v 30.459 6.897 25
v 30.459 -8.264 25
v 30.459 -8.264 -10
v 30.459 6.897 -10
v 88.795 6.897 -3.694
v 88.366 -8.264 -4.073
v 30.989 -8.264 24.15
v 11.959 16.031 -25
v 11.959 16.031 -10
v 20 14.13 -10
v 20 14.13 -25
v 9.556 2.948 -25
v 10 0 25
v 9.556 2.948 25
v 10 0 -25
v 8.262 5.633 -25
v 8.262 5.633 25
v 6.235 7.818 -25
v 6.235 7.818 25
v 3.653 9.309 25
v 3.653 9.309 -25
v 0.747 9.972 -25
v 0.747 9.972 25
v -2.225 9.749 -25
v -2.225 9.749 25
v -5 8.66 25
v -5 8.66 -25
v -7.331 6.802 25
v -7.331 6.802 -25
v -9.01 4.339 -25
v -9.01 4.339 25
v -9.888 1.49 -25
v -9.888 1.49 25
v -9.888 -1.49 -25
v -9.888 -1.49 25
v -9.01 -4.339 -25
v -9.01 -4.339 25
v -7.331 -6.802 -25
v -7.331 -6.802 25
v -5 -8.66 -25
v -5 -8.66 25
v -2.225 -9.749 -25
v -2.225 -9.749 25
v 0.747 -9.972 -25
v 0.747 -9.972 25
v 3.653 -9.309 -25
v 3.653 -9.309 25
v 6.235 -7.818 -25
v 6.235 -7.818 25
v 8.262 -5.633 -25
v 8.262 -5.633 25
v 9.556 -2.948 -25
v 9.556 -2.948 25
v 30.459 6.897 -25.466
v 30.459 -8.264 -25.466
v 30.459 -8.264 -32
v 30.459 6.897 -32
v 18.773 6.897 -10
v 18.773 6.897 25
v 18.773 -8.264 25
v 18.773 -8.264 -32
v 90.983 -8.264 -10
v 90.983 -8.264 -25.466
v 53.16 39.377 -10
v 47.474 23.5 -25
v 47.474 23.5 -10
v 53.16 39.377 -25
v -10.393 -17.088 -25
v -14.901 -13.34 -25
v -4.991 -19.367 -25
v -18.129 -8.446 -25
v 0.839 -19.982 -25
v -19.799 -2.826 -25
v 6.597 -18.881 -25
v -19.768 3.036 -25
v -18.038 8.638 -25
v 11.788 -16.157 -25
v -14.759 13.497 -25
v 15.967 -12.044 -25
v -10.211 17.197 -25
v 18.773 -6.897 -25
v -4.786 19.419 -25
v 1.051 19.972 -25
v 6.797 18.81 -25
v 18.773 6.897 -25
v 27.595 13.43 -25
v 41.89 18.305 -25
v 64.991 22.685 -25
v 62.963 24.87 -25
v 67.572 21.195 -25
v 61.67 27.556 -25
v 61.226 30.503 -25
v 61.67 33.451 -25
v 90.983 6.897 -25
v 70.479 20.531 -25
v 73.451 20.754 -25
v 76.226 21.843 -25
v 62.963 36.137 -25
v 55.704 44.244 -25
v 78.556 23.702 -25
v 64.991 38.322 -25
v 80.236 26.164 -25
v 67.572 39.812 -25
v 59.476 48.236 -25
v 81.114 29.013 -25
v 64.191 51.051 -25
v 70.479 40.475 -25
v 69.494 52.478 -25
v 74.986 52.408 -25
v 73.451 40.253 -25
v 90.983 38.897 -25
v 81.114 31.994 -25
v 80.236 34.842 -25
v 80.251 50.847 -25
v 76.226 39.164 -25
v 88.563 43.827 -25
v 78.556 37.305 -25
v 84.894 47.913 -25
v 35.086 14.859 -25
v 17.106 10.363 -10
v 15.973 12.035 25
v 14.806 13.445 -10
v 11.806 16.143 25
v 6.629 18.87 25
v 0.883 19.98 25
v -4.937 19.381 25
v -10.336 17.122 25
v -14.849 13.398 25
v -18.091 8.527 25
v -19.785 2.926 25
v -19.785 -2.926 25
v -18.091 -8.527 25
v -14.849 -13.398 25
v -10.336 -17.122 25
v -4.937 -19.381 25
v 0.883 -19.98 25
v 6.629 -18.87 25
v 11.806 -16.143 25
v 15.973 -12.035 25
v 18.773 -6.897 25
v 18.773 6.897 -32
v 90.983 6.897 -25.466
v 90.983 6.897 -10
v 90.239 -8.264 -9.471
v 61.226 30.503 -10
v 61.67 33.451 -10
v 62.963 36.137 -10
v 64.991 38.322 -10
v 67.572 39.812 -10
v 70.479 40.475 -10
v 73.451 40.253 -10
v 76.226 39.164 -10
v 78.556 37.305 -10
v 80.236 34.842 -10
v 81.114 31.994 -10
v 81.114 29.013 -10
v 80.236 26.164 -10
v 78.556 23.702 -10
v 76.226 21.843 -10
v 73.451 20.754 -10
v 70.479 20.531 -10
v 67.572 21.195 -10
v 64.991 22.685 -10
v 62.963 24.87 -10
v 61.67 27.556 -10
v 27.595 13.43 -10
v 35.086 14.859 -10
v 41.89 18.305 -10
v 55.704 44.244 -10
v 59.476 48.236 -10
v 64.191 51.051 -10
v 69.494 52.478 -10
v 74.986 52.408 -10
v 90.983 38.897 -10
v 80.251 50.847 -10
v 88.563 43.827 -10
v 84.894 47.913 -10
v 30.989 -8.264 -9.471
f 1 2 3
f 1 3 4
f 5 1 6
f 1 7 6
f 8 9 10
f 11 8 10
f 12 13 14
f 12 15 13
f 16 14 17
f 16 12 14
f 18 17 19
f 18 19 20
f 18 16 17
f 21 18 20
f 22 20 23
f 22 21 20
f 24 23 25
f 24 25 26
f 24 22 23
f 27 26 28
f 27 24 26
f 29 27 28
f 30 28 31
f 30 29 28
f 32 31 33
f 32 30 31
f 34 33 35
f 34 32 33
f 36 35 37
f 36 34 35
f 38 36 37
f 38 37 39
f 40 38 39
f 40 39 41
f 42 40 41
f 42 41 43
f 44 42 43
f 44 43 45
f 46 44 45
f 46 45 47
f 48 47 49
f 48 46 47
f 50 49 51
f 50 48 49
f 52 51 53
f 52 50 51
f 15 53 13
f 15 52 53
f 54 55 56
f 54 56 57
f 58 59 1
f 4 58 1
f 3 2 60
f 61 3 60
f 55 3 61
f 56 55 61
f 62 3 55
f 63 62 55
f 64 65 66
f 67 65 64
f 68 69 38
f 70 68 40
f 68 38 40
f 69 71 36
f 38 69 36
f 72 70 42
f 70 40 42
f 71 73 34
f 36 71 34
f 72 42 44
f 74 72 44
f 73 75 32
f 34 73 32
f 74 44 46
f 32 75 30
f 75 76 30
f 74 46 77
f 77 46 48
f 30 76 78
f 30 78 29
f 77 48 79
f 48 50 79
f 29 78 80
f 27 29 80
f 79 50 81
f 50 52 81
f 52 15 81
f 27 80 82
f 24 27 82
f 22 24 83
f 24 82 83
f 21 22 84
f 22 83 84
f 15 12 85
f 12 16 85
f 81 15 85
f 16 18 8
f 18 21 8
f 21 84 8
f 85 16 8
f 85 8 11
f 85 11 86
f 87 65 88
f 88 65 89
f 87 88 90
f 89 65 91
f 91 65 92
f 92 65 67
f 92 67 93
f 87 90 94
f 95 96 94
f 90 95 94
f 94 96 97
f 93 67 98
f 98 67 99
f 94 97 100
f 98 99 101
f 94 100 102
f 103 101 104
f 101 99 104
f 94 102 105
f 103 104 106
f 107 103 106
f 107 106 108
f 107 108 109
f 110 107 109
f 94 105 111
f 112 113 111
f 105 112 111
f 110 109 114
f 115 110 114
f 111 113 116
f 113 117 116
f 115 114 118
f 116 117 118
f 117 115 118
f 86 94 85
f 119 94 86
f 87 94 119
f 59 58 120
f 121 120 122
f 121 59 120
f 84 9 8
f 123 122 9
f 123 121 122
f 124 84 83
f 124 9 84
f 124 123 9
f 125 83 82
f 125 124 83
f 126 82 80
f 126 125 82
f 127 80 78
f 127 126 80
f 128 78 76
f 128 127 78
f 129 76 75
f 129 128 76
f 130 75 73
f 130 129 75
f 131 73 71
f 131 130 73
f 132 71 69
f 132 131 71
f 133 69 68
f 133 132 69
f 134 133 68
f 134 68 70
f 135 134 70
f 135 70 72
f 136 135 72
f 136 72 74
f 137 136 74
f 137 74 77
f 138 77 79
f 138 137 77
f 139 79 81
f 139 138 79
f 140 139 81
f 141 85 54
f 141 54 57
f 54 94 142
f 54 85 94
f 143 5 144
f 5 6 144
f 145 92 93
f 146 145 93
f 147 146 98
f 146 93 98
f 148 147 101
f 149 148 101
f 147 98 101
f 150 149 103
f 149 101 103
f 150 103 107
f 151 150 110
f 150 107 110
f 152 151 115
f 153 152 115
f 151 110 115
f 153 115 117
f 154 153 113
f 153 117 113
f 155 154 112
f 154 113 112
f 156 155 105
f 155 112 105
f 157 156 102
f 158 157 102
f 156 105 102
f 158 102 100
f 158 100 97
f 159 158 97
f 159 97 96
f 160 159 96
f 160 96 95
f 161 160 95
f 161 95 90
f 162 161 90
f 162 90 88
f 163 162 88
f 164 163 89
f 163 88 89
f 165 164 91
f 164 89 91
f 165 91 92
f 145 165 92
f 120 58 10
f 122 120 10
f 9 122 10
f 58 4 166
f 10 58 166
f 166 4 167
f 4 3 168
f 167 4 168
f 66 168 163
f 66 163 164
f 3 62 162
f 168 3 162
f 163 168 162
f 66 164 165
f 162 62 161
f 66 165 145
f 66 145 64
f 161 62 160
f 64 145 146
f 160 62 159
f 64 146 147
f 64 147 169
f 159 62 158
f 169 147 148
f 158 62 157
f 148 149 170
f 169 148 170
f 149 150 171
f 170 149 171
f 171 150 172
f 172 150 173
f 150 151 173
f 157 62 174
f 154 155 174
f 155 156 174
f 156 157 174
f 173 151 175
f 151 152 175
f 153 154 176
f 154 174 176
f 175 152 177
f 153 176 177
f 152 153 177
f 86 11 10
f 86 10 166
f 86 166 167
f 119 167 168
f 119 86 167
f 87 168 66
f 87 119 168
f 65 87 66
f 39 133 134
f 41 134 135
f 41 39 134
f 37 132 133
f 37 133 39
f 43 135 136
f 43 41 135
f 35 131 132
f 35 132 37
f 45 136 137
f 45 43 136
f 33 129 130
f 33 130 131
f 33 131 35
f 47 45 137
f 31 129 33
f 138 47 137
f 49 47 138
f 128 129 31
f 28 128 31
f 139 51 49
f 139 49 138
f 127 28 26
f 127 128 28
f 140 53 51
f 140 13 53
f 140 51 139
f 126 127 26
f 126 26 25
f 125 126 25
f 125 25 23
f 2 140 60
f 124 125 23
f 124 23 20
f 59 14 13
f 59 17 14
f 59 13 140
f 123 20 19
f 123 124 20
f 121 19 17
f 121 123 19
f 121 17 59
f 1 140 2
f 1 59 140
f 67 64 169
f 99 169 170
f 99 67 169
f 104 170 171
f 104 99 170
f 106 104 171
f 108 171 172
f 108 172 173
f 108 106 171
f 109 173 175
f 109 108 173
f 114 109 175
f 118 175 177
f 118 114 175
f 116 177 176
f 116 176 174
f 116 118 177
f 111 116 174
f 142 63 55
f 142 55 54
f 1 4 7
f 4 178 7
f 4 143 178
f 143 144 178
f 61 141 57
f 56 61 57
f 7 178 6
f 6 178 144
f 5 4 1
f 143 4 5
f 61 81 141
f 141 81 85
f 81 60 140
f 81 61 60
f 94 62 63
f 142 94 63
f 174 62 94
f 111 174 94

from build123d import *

# Parameters (mm, degrees)
SKETCH1_R           = 20
SKETCH1_R_2         = 10
BOSS_EXTRUDE1_DEPTH = 25
SKETCH3_R           = 10
BOSS_EXTRUDE2_DEPTH = 15
SKETCH5_W           = 11.686039437
SKETCH5_H           = 15.160748225
BOSS_EXTRUDE4_DEPTH = 57
BOSS_EXTRUDE7_DEPTH = 15.160748
BOSS_EXTRUDE7_TAPER = 2
SKETCH9_W           = 15.466194976
SKETCH9_H           = 15.160748225
BOSS_EXTRUDE8_DEPTH = 71


with BuildPart() as part:
    # Sketch1 → Boss-Extrude1 (new body, symmetric)
    with BuildSketch(Plane.XY):
        Circle(SKETCH1_R)
        Circle(SKETCH1_R_2, mode=Mode.SUBTRACT)
    extrude(amount=BOSS_EXTRUDE1_DEPTH, both=True)

    # Sketch3 → Boss-Extrude2 (add)
    with BuildSketch(Plane(origin=(0, 0, -25), x_dir=(-1, 0, 0), z_dir=(0, 0, -1))):
        with BuildLine():
            ThreePointArc((-18.773167468, 6.896969133), (-16.030390847, 11.959371609), (-11.959065832, 16.030618966))
            Line((-11.959065832, 16.030618966), (-20, 14.130044659))
            ThreePointArc((-20, 14.130044659), (-35.086276942, 14.859068724), (-47.474240285, 23.499994155))
            Line((-47.474240285, 23.499994155), (-53.159793003, 39.376827298))
            ThreePointArc((-53.159793003, 39.376827298), (-72.24261099, 52.632447176), (-90.982996354, 38.896969133))
            Line((-90.982996354, 38.896969133), (-90.982996354, 6.896969133))
            Line((-90.982996354, 6.896969133), (-18.773167468, 6.896969133))
        make_face()
        with Locations((-71.225862734, 30.503301639)):
            Circle(SKETCH3_R, mode=Mode.SUBTRACT)
    extrude(amount=-BOSS_EXTRUDE2_DEPTH)

    # Sketch5 → Boss-Extrude4 (add)
    with BuildSketch(Plane.XY.offset(25)):
        with Locations((24.616187186, -0.683404979)):
            Rectangle(SKETCH5_W, SKETCH5_H)
    extrude(amount=-BOSS_EXTRUDE4_DEPTH)

    # Sketch9 → Boss-Extrude8 (add)
    with BuildSketch(Plane(origin=(90.982996354, 0, 0), x_dir=(0, 0, -1), z_dir=(1, 0, 0))):
        with Locations((17.733097488, -0.683404979)):
            Rectangle(SKETCH9_W, SKETCH9_H)
    extrude(amount=-BOSS_EXTRUDE8_DEPTH)


with BuildPart() as body_2:
    # Sketch8 → Boss-Extrude7 (new body)
    with BuildSketch(Plane(origin=(0, 6.896969133, 0), x_dir=(1, 0, 0), z_dir=(0, 1, 0))):
        Polygon((30.459206905, -25), (88.794906921, 3.693901382), (90.982996354, 10), (30.459206905, 10), align=None)
    extrude(amount=-BOSS_EXTRUDE7_DEPTH, taper=BOSS_EXTRUDE7_TAPER)


solid = Compound([part.part, body_2.part])
